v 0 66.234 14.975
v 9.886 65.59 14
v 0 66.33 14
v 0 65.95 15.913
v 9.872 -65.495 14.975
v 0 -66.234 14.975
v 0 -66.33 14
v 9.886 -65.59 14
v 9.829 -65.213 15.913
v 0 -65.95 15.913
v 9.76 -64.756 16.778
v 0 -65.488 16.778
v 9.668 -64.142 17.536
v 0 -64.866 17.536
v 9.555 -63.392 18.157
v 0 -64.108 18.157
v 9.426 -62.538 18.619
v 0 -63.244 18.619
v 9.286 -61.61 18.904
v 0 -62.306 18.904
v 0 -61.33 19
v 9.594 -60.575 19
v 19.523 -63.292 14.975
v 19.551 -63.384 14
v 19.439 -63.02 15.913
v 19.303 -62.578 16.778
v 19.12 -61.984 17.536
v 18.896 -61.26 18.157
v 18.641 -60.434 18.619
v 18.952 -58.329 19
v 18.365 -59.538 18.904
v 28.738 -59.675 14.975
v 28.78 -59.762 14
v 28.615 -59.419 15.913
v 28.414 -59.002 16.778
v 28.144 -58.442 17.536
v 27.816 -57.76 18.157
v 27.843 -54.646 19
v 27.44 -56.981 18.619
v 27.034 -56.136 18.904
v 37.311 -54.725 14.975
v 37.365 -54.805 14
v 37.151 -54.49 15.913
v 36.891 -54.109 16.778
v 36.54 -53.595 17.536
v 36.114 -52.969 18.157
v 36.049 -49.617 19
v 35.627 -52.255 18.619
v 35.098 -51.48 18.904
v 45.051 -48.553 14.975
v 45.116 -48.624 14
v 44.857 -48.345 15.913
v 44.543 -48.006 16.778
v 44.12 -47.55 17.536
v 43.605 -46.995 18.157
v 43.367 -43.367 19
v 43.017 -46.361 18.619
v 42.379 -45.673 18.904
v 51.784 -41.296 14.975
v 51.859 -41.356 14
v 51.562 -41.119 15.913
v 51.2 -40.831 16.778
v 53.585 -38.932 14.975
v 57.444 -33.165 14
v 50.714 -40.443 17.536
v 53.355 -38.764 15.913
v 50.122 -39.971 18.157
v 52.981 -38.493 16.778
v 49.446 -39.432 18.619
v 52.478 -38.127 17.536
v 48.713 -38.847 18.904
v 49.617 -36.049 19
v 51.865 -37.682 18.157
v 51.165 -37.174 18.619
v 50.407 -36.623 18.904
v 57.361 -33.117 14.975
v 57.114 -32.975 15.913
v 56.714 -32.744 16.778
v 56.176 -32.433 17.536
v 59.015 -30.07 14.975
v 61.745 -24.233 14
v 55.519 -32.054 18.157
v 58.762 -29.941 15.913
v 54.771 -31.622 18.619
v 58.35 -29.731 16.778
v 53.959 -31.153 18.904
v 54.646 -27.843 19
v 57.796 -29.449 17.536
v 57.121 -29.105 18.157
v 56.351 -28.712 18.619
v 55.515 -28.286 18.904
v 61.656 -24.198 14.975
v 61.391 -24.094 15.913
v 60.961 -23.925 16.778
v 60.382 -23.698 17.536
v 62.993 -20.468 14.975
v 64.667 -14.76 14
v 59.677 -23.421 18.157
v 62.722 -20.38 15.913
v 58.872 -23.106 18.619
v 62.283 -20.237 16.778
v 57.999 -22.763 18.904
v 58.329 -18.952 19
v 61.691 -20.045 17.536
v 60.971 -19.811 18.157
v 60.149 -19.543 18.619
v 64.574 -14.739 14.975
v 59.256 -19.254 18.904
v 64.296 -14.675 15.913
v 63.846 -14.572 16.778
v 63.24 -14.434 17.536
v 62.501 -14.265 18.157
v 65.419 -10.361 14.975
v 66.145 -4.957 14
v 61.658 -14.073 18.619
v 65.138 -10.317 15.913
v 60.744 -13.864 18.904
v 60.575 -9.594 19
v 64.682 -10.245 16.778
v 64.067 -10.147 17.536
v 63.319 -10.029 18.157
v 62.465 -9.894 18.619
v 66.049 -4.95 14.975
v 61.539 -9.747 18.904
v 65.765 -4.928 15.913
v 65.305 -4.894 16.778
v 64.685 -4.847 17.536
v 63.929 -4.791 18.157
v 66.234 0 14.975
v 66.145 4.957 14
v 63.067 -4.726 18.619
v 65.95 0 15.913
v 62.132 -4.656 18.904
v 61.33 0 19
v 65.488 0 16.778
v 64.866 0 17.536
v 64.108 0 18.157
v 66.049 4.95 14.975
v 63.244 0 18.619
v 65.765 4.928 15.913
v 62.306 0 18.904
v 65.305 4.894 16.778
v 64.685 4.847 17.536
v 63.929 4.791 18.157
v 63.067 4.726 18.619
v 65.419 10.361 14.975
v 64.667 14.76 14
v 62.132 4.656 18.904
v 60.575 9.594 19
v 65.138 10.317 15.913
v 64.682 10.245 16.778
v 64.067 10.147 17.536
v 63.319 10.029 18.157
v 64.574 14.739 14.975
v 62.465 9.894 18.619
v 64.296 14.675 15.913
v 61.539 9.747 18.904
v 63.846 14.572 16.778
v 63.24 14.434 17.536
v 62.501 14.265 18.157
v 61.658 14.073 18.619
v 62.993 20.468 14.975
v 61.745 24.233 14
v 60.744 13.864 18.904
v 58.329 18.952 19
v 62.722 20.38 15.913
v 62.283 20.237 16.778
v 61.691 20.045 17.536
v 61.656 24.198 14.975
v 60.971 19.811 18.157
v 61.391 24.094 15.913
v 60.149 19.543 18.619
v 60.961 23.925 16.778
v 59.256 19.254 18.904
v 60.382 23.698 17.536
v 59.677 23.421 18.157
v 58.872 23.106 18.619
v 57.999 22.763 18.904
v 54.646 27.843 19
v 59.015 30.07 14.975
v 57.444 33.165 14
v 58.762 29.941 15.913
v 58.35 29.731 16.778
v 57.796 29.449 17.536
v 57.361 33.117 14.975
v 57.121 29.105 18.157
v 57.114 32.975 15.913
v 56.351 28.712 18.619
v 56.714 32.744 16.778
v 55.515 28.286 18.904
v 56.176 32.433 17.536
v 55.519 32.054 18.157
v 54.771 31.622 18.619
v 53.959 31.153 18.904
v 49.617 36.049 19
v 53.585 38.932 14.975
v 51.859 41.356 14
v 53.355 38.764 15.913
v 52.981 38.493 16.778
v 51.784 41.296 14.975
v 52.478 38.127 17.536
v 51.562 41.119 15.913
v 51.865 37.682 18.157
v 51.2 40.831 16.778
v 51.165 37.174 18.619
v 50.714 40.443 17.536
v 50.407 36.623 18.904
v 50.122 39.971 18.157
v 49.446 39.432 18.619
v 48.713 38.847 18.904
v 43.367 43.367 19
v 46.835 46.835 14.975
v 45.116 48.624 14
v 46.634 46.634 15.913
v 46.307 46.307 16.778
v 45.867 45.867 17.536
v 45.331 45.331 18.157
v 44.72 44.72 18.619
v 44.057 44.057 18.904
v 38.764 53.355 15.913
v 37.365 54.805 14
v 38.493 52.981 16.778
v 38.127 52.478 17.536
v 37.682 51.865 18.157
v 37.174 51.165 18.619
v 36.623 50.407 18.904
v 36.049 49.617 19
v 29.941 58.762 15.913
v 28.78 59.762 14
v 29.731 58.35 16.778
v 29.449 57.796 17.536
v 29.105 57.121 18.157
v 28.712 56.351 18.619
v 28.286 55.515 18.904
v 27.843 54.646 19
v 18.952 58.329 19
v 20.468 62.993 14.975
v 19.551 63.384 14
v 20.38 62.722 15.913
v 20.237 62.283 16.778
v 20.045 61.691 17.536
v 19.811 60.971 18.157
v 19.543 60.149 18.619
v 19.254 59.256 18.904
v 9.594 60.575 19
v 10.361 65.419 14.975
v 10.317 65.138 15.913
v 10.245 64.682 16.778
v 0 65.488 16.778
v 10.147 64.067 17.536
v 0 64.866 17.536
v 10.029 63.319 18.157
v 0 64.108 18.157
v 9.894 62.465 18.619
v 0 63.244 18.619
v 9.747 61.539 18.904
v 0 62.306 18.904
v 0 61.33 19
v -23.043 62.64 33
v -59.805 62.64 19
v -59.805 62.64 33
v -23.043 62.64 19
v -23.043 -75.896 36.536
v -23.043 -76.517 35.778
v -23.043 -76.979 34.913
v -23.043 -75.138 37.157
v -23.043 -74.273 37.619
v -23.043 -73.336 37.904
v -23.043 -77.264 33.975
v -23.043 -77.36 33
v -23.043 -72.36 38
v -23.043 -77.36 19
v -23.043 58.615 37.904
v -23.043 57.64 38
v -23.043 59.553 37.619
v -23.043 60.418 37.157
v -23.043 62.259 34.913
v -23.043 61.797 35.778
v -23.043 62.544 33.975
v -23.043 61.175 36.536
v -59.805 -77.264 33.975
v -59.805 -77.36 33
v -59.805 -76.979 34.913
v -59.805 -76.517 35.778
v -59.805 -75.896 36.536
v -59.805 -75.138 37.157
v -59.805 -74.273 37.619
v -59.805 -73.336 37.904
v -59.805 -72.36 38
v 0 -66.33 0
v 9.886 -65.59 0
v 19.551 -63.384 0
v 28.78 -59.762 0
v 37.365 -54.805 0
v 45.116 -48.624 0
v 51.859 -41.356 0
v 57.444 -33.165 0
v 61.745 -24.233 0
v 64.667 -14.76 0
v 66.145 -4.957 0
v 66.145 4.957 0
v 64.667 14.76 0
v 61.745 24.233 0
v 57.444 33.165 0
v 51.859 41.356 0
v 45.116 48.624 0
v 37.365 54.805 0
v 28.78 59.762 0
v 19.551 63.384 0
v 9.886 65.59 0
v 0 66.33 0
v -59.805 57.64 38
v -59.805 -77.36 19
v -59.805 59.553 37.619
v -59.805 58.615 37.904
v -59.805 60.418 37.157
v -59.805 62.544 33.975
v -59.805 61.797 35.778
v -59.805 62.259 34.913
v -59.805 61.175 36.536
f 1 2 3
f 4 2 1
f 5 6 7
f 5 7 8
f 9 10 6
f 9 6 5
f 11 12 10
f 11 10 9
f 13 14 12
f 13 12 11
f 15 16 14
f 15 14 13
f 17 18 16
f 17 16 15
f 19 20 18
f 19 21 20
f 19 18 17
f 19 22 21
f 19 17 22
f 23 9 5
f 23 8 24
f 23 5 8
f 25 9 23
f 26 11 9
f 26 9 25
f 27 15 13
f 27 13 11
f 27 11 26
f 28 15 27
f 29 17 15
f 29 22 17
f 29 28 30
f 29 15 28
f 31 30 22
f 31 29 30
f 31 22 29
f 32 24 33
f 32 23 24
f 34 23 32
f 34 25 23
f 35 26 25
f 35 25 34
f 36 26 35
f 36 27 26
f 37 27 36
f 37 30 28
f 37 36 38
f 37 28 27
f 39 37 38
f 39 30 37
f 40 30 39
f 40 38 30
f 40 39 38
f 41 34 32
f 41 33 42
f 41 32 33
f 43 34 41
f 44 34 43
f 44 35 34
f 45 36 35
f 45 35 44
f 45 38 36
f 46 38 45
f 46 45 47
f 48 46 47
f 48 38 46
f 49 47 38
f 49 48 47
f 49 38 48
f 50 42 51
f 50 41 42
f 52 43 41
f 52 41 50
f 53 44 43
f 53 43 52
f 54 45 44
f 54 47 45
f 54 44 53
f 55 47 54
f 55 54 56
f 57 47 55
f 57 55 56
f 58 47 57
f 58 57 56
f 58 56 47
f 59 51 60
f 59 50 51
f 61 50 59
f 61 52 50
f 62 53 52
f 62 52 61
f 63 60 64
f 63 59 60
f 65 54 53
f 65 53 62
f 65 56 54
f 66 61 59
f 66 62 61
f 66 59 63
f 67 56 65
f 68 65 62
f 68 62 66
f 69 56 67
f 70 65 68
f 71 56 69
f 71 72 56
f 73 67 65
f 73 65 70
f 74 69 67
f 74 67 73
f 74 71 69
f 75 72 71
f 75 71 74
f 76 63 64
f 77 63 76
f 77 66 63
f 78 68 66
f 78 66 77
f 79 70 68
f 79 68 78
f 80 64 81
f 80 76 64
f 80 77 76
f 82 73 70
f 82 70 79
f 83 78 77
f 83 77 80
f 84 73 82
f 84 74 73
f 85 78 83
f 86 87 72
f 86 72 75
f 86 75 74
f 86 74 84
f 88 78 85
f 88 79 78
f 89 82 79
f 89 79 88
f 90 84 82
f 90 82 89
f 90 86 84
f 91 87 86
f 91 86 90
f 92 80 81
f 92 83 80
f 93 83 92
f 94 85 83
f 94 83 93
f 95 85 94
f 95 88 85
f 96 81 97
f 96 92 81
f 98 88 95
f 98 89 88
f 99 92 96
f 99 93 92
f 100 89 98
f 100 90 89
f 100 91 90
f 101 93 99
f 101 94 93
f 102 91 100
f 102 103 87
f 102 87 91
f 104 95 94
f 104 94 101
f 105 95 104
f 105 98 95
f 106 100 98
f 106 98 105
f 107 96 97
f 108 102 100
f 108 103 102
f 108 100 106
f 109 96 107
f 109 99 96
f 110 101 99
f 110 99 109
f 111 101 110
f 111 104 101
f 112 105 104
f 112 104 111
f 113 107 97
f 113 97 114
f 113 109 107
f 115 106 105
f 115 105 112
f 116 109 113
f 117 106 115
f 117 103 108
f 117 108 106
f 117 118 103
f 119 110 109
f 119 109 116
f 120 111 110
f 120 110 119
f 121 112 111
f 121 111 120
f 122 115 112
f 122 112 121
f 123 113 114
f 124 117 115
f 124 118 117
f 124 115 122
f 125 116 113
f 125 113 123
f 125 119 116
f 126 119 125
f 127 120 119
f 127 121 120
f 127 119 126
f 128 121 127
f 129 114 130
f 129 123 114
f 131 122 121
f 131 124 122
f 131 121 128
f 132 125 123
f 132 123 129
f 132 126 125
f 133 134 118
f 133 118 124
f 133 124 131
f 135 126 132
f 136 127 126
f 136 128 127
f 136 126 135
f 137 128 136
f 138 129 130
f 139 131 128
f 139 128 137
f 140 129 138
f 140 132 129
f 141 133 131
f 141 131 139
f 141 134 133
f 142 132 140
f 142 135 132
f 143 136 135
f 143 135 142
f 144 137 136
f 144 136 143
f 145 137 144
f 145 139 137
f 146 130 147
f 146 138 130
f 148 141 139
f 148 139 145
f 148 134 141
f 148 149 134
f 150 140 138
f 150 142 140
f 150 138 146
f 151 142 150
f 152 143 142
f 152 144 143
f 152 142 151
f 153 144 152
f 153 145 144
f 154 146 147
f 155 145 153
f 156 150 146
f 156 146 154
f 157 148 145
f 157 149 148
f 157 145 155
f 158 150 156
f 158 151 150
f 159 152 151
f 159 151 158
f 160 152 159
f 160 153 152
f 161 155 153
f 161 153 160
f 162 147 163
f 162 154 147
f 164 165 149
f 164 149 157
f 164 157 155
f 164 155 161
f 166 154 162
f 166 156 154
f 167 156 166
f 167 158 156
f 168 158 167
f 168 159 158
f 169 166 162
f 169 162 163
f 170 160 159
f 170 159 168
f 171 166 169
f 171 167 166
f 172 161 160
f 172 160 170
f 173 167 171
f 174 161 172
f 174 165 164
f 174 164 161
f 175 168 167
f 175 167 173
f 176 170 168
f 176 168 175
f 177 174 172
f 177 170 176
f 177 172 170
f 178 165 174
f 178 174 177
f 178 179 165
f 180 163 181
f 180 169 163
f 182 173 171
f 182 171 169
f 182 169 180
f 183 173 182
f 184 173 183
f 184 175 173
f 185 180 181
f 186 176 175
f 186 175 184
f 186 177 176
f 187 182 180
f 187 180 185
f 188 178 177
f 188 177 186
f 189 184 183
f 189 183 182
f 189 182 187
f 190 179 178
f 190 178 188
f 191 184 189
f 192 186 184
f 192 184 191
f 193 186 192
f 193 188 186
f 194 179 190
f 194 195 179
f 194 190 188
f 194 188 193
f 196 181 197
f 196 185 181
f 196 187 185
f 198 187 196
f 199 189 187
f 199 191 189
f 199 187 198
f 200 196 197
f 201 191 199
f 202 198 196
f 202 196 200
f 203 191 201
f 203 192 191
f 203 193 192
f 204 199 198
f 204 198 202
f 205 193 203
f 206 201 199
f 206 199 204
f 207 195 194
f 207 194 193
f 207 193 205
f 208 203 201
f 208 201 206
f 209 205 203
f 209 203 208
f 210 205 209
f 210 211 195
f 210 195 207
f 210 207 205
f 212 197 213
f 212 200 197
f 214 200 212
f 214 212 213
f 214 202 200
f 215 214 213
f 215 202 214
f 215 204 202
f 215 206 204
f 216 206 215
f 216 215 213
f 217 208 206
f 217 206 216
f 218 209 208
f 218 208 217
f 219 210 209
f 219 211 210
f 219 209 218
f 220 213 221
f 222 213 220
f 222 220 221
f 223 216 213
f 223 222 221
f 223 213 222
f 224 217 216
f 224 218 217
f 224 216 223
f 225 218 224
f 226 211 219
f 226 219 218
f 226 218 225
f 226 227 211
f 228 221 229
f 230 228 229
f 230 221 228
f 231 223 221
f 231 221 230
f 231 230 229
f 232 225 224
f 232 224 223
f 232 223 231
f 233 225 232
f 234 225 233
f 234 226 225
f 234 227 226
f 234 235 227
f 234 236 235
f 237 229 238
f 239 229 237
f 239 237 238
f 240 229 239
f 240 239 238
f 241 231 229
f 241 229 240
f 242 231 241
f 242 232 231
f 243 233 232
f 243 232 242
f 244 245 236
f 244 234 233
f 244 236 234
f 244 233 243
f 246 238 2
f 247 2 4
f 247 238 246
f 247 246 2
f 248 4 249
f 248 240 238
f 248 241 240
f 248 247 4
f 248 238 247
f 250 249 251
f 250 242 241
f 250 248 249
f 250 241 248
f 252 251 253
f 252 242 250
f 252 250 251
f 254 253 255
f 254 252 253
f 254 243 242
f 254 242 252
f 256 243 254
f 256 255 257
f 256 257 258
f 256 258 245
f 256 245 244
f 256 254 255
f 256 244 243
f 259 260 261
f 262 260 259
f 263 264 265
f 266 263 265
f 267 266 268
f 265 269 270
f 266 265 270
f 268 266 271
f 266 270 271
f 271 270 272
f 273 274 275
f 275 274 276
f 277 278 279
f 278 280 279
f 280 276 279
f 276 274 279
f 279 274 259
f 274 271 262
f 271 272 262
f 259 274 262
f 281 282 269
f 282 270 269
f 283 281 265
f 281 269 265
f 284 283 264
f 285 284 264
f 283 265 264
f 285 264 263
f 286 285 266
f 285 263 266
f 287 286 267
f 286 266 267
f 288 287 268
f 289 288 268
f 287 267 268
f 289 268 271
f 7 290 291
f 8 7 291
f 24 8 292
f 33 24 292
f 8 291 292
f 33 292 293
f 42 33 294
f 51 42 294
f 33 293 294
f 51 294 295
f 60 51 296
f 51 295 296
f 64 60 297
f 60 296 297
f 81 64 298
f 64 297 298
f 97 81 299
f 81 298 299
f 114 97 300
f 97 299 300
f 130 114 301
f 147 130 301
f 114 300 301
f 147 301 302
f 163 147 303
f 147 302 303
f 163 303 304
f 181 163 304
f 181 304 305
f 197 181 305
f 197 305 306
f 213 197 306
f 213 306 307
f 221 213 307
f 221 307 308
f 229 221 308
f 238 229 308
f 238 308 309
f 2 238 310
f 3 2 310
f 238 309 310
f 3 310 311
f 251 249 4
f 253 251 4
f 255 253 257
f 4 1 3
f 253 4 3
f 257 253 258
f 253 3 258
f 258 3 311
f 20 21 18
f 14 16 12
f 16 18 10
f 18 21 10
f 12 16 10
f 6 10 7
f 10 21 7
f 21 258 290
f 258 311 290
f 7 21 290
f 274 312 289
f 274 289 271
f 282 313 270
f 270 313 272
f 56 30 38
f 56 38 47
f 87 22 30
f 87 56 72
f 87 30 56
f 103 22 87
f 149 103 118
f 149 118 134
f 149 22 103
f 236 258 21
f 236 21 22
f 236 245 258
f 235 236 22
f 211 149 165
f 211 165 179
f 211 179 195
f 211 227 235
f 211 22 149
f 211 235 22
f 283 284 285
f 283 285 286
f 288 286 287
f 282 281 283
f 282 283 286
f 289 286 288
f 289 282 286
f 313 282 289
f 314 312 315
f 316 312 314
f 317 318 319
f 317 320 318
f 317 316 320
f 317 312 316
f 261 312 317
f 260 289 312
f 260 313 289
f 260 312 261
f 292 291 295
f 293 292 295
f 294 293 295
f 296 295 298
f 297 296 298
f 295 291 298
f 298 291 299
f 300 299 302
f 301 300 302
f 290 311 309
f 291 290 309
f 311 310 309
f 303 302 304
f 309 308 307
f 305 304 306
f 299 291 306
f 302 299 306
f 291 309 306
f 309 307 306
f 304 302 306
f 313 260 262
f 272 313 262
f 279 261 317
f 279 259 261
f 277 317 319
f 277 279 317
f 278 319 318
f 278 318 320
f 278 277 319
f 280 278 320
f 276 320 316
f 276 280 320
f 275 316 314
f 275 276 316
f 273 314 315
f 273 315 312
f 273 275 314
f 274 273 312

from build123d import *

# Parameters (mm, degrees)
F1_DEPTH = 19
F2_W     = 36.761642
F2_H     = 140
F3_DEPTH = 19
F4_R     = 5
F5_R     = 5


with BuildPart() as f1:
    # F0 (on Top) → F1 (new body)
    with BuildSketch(Plane.XY):
        with BuildLine():
            Line((0, 66.330475), (0, -66.330475))
            ThreePointArc((0, -66.330475), (66.330475, 0), (0, 66.330475))
        make_face()
    extrude(amount=F1_DEPTH)

    # F4
    f4_edges = [f1.edges().sort_by_distance(p)[0] for p in [
        (66.330475, 0, 19),
    ]]
    fillet(f4_edges, radius=F4_R)


with BuildPart() as f3:
    # F2 (on face) → F3 (new body)
    with BuildSketch(Plane.XY.offset(19)):
        with Locations((-41.423712, -7.360049)):
            Rectangle(F2_W, F2_H)
    extrude(amount=F3_DEPTH)

    # F5
    f5_edges = [f3.edges().sort_by_distance(p)[0] for p in [
        (-41.423712, -77.360049, 38),
        (-41.423712, 62.639951, 38),
    ]]
    fillet(f5_edges, radius=F5_R)


solid = Compound([f1.part, f3.part])
